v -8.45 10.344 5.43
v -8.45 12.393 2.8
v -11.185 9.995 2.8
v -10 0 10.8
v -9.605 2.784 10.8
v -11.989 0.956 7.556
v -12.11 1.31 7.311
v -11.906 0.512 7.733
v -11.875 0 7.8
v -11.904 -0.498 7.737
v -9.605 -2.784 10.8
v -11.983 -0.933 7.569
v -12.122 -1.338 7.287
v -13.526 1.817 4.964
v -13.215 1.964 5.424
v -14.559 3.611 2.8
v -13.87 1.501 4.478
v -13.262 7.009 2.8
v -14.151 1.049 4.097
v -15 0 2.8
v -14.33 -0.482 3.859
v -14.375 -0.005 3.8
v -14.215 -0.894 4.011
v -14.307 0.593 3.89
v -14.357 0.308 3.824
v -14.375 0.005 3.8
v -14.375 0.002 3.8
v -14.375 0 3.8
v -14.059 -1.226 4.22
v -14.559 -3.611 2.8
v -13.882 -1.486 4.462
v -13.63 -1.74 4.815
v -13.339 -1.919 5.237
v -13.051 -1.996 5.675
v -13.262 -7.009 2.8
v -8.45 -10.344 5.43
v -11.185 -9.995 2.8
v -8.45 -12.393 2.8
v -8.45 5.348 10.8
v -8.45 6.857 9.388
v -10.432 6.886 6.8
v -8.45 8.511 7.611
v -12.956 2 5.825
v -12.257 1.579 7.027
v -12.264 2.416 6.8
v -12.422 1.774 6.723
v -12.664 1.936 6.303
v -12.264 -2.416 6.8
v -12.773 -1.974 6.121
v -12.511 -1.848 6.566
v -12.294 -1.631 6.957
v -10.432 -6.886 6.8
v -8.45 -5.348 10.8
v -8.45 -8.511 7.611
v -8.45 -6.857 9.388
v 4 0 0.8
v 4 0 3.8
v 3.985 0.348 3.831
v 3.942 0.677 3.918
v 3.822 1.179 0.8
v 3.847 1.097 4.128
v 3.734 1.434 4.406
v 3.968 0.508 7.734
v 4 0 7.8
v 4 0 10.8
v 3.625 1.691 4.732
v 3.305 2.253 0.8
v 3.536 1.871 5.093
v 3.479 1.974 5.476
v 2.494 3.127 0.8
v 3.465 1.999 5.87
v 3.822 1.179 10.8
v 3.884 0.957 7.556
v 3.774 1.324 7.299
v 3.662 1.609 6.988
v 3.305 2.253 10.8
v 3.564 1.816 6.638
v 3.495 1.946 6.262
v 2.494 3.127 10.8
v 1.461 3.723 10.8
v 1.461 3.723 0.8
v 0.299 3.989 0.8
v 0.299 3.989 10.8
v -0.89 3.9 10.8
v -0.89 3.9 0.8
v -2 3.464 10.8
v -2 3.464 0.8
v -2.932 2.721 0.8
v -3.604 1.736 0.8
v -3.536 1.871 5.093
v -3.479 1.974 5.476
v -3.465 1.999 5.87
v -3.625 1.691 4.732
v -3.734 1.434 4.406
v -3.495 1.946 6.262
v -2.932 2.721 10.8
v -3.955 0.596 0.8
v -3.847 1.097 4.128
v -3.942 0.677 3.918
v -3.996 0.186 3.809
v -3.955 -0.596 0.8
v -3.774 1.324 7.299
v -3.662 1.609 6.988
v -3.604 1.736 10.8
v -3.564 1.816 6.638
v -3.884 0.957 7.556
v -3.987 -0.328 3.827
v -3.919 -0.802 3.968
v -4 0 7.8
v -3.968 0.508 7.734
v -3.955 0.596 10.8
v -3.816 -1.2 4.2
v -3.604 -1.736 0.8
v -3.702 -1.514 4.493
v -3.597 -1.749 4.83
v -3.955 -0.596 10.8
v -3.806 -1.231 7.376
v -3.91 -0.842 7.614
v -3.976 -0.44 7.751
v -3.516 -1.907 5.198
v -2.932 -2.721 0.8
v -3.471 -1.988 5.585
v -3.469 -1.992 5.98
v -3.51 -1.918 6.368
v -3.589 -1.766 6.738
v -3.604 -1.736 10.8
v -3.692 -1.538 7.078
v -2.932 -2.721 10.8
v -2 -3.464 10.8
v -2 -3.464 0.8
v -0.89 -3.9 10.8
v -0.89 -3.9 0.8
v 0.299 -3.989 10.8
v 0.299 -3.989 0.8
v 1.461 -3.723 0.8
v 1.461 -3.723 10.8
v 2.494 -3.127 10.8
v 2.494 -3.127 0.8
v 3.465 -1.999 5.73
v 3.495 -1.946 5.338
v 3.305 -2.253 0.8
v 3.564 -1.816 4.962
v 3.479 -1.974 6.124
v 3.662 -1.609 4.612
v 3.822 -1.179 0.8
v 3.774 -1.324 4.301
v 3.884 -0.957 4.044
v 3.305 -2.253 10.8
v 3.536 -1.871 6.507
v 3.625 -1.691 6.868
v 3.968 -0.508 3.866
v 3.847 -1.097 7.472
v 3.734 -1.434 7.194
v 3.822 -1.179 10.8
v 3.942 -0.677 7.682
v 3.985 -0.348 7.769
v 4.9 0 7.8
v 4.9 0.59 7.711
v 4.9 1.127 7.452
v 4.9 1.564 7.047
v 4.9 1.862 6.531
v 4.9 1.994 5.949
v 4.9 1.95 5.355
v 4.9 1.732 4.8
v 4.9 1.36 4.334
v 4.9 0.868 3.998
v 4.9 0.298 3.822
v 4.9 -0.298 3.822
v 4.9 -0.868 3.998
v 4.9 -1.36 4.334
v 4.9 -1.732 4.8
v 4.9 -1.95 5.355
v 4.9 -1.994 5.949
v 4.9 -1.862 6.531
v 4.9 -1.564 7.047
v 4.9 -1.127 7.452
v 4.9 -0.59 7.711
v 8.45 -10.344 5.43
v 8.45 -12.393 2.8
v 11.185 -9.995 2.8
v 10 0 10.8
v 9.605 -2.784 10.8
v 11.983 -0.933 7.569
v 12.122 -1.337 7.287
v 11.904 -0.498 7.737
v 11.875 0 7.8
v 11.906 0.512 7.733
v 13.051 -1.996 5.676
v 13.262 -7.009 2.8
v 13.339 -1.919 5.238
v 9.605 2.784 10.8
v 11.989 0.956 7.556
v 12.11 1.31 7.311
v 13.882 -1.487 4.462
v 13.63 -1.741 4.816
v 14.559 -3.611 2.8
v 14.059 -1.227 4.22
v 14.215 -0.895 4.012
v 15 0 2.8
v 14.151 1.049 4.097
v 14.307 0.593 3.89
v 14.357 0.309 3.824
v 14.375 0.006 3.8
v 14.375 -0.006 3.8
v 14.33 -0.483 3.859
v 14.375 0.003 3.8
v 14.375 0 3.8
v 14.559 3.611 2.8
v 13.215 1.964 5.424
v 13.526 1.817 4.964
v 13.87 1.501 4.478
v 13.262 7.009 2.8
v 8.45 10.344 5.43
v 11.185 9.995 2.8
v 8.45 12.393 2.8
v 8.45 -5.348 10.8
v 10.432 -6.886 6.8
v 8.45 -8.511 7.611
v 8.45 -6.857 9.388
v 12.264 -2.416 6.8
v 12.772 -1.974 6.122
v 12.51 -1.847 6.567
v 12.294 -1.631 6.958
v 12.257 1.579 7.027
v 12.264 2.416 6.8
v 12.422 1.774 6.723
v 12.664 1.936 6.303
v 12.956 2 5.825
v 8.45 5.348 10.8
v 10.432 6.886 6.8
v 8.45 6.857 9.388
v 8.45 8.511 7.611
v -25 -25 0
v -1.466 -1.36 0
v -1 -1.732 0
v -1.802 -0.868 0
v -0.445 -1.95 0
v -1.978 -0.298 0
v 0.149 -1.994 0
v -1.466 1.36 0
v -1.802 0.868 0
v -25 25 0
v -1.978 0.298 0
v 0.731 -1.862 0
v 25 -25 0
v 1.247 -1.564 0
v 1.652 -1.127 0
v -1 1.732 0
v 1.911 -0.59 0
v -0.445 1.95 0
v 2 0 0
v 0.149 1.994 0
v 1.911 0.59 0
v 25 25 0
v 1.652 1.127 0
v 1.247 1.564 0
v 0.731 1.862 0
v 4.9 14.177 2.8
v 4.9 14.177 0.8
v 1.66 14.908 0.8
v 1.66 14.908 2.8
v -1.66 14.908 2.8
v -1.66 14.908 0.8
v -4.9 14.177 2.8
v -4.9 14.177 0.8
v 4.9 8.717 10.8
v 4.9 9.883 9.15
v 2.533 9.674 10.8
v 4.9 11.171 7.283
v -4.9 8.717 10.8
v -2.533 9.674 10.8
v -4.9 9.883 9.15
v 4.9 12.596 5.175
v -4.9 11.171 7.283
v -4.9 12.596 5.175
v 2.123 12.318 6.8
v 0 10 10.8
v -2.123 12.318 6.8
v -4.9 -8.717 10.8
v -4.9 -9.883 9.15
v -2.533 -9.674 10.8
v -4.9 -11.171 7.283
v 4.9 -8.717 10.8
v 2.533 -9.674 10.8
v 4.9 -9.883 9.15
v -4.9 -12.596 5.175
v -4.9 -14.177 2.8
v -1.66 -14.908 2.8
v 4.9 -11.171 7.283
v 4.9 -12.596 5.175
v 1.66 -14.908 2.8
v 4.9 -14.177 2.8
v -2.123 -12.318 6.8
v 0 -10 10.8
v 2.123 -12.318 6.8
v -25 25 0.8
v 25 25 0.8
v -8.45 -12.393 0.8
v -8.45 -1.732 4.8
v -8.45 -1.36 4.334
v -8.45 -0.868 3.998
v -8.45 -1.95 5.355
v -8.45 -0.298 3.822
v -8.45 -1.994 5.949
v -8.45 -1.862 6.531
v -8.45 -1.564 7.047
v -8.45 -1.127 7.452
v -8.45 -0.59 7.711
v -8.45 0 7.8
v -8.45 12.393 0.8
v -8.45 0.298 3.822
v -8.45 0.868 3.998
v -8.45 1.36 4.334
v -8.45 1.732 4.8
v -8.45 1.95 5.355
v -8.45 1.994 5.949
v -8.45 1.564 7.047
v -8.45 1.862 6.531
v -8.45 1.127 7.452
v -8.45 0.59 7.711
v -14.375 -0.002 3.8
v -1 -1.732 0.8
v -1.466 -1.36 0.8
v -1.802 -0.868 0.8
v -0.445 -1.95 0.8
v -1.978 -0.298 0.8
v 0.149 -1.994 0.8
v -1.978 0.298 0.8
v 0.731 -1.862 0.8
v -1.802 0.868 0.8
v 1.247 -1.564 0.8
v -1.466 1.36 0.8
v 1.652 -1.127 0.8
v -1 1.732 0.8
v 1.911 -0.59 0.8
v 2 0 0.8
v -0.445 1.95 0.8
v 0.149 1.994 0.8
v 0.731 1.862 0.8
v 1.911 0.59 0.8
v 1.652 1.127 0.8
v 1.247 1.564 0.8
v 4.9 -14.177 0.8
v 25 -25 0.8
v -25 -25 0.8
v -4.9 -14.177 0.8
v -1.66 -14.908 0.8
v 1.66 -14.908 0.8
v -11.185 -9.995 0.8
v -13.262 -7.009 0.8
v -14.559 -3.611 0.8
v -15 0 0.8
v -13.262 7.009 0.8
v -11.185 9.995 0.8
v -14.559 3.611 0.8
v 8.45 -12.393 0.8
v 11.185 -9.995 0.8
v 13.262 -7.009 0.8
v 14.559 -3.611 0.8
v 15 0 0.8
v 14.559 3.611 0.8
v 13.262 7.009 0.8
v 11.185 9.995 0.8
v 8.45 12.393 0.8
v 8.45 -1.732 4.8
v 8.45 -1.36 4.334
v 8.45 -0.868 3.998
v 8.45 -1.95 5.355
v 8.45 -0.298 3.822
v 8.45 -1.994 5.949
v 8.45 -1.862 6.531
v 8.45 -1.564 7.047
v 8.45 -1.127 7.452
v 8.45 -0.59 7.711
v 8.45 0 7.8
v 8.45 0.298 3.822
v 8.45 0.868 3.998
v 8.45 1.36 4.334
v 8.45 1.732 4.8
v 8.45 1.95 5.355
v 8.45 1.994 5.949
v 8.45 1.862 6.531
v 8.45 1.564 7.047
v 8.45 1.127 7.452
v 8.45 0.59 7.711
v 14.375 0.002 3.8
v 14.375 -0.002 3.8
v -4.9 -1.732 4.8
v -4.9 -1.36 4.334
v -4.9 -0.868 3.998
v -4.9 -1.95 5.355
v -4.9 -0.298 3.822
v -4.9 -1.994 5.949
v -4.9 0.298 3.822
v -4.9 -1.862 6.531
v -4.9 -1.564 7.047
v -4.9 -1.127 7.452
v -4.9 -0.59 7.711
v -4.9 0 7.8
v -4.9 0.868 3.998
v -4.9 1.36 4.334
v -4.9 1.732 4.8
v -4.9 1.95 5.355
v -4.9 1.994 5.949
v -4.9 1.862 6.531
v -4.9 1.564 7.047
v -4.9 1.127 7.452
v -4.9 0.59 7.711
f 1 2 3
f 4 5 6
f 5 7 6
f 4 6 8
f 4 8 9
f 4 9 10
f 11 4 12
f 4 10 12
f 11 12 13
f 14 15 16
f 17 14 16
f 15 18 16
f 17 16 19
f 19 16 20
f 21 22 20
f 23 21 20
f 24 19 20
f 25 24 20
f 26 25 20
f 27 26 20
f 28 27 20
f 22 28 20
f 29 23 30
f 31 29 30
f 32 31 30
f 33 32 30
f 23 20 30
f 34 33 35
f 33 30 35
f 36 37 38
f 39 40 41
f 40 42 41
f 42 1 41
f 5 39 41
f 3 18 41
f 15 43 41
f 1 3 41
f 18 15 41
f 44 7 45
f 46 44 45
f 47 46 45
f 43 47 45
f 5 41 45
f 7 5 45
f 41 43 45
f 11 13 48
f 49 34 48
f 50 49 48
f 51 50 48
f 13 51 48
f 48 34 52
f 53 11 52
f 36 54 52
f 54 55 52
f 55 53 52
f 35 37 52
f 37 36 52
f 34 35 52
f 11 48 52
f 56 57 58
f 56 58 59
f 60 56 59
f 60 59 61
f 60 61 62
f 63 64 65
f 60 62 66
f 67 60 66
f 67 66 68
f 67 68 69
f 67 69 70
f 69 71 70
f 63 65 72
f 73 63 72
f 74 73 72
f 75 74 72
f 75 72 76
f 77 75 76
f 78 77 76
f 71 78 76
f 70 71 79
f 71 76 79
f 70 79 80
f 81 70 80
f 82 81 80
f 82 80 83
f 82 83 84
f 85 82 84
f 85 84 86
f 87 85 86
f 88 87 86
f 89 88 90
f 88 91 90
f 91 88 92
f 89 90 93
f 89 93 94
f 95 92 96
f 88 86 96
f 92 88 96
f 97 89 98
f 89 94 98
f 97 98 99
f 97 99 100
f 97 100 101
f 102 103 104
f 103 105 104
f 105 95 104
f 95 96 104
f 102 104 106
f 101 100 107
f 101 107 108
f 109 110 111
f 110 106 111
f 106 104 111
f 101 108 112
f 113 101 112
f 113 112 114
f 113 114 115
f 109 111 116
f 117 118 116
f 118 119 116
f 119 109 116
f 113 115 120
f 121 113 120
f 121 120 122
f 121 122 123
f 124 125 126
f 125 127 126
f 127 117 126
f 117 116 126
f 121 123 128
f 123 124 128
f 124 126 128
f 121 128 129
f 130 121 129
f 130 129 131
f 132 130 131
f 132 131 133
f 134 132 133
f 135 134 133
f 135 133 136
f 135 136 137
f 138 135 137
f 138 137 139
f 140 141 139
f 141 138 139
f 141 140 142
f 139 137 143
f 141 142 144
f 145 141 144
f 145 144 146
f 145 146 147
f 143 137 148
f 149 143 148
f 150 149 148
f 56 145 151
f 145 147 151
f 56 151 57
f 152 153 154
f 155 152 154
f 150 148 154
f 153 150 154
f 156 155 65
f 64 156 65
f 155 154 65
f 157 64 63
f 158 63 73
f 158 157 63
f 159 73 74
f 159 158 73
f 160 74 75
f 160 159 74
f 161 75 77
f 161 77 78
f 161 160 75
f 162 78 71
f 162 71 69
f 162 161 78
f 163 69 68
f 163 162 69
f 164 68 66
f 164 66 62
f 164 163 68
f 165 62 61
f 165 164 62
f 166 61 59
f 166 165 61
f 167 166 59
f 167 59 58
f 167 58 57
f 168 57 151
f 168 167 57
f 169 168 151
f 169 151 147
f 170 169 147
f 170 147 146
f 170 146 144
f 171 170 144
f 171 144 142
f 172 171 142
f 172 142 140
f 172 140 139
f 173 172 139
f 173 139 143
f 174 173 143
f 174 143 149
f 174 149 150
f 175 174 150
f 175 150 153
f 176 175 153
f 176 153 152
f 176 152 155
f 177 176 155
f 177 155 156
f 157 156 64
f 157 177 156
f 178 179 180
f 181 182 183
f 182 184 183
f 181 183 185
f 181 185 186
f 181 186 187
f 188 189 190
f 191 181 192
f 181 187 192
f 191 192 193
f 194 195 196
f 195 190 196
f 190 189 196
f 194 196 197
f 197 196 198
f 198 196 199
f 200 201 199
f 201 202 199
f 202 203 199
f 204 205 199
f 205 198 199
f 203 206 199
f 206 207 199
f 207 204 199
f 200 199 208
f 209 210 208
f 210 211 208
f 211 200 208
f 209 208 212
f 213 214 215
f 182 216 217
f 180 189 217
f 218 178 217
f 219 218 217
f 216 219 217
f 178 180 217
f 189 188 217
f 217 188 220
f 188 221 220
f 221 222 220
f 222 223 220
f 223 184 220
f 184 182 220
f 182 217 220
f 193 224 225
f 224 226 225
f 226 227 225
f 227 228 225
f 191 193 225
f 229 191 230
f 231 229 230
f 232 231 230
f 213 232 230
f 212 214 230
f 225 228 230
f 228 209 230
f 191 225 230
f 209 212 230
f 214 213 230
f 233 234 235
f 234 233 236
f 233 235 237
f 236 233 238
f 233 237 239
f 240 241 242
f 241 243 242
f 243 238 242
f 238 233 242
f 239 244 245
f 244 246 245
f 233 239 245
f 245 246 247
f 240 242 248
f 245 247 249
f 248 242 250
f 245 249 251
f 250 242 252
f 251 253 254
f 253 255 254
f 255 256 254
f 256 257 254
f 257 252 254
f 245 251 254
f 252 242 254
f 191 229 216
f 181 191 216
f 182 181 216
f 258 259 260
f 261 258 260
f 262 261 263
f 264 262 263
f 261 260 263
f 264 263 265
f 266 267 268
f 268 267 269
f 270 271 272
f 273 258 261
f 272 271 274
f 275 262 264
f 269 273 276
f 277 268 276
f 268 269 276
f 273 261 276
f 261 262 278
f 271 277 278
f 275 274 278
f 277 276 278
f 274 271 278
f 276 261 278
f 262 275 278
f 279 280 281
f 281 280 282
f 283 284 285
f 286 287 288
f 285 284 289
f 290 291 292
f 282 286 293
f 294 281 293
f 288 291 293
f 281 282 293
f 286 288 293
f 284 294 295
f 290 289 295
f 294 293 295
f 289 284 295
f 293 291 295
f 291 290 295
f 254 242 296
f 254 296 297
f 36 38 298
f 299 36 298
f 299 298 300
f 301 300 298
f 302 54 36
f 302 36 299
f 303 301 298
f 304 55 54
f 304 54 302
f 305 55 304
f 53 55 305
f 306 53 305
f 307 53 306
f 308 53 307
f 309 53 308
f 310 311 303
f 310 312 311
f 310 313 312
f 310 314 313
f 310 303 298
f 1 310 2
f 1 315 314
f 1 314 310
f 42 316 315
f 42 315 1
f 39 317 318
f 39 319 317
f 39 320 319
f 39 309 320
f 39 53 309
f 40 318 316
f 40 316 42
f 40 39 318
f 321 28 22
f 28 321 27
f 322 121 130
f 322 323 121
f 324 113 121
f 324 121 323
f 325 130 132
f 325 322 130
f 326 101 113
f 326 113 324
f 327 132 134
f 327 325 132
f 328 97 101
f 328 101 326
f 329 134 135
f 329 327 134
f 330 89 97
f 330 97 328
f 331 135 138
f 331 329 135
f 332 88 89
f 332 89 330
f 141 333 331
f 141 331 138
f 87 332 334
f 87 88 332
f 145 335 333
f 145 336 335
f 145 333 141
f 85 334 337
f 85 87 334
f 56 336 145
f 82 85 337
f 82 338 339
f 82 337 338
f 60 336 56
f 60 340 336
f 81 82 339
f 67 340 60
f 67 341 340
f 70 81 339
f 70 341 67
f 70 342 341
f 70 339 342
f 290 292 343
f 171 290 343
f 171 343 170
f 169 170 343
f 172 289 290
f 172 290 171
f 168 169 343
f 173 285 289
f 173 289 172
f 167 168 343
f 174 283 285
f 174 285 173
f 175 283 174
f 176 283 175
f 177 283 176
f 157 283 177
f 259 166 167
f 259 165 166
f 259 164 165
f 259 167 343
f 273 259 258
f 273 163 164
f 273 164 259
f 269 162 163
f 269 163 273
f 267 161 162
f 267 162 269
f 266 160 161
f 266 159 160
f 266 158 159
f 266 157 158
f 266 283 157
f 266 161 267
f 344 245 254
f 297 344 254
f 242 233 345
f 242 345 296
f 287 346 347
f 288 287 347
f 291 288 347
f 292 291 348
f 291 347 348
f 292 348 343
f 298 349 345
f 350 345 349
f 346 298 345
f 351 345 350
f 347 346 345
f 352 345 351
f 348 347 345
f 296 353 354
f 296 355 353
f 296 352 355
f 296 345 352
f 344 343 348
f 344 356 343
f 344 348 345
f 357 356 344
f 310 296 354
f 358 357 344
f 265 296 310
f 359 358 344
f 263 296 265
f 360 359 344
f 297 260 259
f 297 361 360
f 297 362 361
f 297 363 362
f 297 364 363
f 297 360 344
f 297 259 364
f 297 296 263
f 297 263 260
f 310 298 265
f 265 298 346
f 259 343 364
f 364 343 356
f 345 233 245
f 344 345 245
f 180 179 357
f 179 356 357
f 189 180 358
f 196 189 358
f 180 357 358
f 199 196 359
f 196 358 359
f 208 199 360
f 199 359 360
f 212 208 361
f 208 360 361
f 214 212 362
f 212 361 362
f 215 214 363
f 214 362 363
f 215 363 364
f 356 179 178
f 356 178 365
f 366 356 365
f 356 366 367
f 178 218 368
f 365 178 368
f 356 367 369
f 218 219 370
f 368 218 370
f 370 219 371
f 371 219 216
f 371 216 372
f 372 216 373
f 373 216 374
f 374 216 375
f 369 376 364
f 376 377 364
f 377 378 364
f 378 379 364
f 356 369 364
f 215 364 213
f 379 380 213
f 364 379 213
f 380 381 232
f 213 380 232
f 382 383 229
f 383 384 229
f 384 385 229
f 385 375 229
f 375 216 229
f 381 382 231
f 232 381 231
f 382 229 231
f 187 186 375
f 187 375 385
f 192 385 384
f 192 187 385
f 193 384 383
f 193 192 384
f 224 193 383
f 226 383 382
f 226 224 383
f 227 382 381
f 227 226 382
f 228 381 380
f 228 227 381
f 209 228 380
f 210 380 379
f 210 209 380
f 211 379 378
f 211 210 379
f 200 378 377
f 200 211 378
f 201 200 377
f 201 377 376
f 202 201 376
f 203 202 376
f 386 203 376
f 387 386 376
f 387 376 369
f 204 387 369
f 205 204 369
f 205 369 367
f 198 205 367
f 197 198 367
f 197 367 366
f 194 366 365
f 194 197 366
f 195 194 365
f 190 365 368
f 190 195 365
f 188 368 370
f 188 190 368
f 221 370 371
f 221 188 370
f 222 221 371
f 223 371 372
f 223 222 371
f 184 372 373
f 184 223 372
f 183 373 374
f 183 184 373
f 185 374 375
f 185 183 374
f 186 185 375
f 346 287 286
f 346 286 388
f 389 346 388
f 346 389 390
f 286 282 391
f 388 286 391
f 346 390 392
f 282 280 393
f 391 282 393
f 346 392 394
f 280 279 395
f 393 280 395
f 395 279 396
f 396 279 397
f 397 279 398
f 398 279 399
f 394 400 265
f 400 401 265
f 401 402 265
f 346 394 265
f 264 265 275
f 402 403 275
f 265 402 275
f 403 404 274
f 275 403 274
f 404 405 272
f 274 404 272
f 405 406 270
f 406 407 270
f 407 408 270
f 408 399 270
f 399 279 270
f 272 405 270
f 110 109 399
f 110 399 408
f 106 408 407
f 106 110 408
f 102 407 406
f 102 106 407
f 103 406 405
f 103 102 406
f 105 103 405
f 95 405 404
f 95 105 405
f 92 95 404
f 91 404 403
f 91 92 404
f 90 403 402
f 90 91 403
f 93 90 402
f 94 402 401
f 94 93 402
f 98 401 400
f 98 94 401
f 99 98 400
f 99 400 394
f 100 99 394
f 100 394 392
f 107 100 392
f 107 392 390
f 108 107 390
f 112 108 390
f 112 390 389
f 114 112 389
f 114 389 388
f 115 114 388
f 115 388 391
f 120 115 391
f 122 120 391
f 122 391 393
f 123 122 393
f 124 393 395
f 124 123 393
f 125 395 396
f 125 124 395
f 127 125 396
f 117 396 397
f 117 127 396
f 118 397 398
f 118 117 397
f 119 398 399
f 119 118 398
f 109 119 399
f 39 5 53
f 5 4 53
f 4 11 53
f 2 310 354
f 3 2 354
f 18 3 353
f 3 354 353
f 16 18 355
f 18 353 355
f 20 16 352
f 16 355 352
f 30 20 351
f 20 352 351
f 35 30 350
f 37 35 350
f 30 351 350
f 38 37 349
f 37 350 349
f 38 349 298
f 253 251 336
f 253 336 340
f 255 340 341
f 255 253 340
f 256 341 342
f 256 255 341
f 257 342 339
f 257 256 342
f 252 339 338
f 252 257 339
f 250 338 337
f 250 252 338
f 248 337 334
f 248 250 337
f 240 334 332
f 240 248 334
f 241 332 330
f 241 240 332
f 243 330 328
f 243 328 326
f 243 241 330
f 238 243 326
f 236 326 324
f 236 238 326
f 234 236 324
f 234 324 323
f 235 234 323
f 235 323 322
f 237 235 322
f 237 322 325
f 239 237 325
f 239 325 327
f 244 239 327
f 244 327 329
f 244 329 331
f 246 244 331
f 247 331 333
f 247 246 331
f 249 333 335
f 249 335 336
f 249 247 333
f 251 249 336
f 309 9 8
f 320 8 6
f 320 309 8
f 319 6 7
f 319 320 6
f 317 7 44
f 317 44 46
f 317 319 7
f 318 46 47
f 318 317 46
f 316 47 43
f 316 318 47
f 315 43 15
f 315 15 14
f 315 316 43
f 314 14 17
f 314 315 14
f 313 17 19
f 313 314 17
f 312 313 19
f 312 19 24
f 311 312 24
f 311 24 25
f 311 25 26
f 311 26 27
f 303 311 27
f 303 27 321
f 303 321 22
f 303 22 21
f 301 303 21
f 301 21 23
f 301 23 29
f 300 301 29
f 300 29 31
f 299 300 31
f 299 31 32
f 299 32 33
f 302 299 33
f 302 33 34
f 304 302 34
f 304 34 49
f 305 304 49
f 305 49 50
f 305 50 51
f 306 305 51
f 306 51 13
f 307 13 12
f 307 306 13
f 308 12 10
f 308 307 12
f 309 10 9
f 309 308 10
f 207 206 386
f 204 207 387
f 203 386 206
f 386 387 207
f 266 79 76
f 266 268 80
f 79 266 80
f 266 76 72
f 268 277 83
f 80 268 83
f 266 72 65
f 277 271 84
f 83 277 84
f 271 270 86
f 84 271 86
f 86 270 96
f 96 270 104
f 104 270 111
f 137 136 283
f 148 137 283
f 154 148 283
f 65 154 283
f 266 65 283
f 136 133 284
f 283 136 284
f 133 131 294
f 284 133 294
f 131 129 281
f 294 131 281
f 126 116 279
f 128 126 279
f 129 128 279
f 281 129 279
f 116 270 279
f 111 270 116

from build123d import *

# Parameters (mm, degrees)
CROQUIS1_W              = 50
CROQUIS1_H              = 50
CROQUIS1_R              = 2
SALIENTE_EXTRUIR2_DEPTH = 0.8
CROQUIS4_R              = 4
CROQUIS4_W              = 3.55
CROQUIS4_H              = 40
CORTAR_EXTRUIR1_DEPTH   = 10
CORTAR_EXTRUIR2_START   = -39.374993
CROQUIS7_R              = 2
CORTAR_EXTRUIR2_DEPTH   = 28.749989
SALIENTE_EXTRUIR4_DEPTH = 10


with BuildPart() as part:
    # Croquis1 → Saliente-Extruir2 (new body)
    with BuildSketch(Plane.XY):
        Rectangle(CROQUIS1_W, CROQUIS1_H)
        Circle(CROQUIS1_R, mode=Mode.SUBTRACT)
    extrude(amount=SALIENTE_EXTRUIR2_DEPTH)

    # Croquis2 → Revolución1 (revolve)
    with BuildSketch(Plane(origin=(0, 0, 0), x_dir=(0, 0, -1), z_dir=(1, 0, 0))):
        Polygon((-0.8, 0), (-10.8, 0), (-10.8, 10), (-2.8, 15), (-0.8, 15), align=None)
    revolve(axis=Axis((0, 0, 0.8), (0, 0, 1)))

    # Croquis4 → Cortar-Extruir1 (cut)
    with BuildSketch(Plane.XY.offset(10.8)):
        Circle(CROQUIS4_R)
        with Locations((-6.675, 0)):
            Rectangle(CROQUIS4_W, CROQUIS4_H)
        with Locations((6.675, 0)):
            Rectangle(CROQUIS4_W, CROQUIS4_H)
    extrude(amount=-CORTAR_EXTRUIR1_DEPTH, mode=Mode.SUBTRACT)

    # Croquis7 → Cortar-Extruir2 (cut)
    with BuildSketch(Plane.ZY.offset(25).offset(CORTAR_EXTRUIR2_START)):
        with Locations((5.8, 0)):
            Circle(CROQUIS7_R)
    extrude(amount=CORTAR_EXTRUIR2_DEPTH, mode=Mode.SUBTRACT)

    # Croquis3 → Saliente-Extruir4 (add)
    with BuildSketch(Plane.XY.offset(0.8)):
        with BuildLine():
            Line((20, -25), (25, -25))
            Line((25, -25), (25, -20))
            ThreePointArc((25, -20), (28.535533906, -28.535533906), (20, -25))
        make_face()
    extrude(amount=SALIENTE_EXTRUIR4_DEPTH)


with BuildPart() as saliente_extruir4_kept_piece:
    # of the separate pieces the step leaves, the one the design keeps (saliente_extruir4_pieces_kept)
    add(part.part.solids().sort_by_distance((25, -25, 0))[0])


solid = saliente_extruir4_kept_piece.part
